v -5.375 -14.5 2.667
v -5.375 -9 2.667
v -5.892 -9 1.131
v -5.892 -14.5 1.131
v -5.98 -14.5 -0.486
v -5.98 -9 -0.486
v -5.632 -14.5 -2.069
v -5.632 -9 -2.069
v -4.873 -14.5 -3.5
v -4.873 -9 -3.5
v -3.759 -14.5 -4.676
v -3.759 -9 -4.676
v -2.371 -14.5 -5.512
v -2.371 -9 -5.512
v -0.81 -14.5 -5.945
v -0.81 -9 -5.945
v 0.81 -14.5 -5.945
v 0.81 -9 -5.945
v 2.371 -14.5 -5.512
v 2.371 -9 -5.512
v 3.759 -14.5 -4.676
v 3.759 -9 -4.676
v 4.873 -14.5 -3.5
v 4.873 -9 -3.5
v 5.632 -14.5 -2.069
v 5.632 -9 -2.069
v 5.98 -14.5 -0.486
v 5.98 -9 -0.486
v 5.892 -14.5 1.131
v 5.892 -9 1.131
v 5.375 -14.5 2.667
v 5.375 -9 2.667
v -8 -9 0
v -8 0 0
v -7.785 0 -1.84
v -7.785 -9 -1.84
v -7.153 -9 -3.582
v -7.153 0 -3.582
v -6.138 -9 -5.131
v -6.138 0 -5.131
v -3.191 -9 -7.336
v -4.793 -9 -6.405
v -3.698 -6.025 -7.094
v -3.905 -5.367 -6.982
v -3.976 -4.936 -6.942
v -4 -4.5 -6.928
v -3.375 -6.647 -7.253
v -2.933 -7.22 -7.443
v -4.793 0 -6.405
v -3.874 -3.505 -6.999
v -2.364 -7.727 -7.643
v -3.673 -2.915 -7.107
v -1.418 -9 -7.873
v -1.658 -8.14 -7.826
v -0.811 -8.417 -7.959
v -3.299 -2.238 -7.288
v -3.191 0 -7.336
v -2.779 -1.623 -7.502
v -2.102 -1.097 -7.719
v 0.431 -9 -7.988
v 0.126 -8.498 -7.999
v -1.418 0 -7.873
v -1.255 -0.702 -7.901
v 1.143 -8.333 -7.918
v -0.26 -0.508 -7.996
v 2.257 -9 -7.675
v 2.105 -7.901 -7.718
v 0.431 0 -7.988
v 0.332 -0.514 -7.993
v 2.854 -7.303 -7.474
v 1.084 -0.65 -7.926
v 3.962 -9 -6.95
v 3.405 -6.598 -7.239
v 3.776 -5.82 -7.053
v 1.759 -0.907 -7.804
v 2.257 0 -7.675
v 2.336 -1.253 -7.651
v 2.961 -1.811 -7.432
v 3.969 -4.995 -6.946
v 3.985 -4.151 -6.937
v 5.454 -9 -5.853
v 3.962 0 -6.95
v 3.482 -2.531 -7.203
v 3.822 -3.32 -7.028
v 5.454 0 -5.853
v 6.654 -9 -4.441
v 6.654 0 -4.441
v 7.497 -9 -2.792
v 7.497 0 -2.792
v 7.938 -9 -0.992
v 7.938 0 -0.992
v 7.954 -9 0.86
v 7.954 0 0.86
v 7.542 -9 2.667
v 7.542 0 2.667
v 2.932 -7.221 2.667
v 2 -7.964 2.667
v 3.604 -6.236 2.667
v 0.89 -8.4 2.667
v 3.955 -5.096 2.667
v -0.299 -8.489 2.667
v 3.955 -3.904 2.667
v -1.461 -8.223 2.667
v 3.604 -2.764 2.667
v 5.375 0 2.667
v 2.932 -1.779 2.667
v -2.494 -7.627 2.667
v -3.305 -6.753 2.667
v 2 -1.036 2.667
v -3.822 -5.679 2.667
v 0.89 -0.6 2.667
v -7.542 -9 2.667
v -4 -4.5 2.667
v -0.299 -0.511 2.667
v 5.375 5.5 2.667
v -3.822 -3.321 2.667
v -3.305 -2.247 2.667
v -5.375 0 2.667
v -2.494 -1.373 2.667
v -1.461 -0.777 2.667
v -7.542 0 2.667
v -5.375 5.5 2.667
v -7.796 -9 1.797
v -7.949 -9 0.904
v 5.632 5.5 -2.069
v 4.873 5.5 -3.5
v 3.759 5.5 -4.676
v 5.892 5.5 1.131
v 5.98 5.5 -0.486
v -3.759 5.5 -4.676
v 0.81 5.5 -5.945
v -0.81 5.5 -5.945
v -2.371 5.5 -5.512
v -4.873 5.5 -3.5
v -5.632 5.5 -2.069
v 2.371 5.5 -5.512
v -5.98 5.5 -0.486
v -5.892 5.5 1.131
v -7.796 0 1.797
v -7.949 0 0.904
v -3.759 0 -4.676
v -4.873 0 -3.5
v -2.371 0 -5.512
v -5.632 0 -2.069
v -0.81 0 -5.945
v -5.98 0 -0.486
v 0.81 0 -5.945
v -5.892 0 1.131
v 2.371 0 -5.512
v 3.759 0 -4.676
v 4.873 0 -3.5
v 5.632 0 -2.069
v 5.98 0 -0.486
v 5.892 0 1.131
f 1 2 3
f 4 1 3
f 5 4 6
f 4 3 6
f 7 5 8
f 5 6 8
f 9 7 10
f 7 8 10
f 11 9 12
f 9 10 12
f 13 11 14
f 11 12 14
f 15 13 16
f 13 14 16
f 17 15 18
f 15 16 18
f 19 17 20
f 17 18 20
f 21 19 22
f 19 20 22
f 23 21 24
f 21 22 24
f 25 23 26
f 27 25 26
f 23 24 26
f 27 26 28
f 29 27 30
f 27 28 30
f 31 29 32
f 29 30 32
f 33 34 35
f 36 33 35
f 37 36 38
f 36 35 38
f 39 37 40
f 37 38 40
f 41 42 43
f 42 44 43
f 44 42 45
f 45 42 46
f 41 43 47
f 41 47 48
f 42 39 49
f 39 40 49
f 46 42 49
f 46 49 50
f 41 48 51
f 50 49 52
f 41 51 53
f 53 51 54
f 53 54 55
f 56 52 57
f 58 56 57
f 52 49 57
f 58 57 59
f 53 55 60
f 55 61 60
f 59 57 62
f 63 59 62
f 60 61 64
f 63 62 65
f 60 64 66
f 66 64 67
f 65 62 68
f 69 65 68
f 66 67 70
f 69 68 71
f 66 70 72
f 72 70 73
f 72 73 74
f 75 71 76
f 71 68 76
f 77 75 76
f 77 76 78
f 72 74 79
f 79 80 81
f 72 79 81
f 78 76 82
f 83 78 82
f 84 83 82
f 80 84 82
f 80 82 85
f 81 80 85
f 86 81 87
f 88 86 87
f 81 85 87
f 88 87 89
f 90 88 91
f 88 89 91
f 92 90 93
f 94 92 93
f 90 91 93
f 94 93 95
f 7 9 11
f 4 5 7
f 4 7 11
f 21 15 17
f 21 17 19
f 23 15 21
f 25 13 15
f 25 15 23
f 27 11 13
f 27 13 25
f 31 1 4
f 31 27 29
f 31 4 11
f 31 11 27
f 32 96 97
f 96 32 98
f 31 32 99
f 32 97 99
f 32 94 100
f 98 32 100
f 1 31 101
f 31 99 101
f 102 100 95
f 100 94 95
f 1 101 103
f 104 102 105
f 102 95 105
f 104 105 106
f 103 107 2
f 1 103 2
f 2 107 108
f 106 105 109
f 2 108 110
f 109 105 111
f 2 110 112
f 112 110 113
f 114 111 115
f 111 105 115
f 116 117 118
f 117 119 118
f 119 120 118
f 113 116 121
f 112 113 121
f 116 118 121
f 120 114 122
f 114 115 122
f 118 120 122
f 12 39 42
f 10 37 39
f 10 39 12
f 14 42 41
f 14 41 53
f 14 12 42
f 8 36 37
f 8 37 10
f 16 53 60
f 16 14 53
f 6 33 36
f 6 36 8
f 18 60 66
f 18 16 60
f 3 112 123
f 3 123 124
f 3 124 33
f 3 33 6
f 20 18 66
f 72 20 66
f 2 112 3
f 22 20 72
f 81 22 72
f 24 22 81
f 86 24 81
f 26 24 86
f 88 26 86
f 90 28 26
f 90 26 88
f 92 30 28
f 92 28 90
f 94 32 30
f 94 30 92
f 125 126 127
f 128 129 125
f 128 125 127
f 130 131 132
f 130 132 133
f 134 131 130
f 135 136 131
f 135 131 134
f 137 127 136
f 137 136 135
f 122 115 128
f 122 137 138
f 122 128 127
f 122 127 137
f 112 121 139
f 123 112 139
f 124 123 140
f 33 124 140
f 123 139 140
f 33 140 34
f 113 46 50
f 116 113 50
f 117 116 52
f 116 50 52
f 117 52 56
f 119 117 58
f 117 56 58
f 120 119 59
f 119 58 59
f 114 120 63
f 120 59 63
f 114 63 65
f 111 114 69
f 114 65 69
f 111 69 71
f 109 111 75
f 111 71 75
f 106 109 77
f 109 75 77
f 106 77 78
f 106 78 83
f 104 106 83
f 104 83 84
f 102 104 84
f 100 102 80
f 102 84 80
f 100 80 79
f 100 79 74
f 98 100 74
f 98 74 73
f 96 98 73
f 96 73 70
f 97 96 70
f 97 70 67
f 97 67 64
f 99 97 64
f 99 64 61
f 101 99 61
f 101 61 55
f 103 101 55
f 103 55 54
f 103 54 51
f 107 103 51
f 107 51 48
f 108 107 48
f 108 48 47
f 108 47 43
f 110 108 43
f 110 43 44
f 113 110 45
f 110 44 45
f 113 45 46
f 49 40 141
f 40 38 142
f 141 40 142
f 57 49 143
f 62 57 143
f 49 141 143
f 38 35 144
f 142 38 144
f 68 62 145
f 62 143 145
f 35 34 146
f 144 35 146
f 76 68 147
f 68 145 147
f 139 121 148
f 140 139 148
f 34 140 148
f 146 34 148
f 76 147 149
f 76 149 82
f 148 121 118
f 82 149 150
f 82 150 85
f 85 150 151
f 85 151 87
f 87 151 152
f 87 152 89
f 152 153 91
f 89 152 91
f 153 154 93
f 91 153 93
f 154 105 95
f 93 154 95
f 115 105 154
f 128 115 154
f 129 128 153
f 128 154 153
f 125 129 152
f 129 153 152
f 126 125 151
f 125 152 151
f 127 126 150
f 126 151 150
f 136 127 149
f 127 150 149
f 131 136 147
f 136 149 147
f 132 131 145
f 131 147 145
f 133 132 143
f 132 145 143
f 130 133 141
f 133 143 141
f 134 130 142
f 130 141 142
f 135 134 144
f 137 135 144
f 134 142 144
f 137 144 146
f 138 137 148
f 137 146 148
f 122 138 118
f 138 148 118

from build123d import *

# Parameters (mm, degrees)
F1_DEPTH = 9
F3_D     = 8
F5_DEPTH = 5.5
F7_DEPTH = 5.5


with BuildPart() as f1:
    # F0 (on Front) → F1 (new body)
    with BuildSketch(Plane.XZ):
        with BuildLine():
            ThreePointArc((-7.542472, 2.666667), (-7.884788, 1.352816), (-8, 0))
            ThreePointArc((-8, 0), (1.352816, -7.884788), (7.542472, 2.666667))
            Line((7.542472, 2.666667), (-7.542472, 2.666667))
        make_face()
    extrude(amount=F1_DEPTH)

    # F3 (through all)
    with Locations(Plane.XY.offset(2.666667)):
        with Locations((0, -4.5)):
            Hole(F3_D / 2)

    # F4 (on face) → F5 (join)
    with BuildSketch(Plane.XZ.offset(9)):
        with BuildLine():
            Line((5.374838, 2.666667), (-5.374838, 2.666667))
            ThreePointArc((-5.374838, 2.666667), (0, -6), (5.374838, 2.666667))
        make_face()
    extrude(amount=F5_DEPTH)

    # F6 (on face) → F7 (join)
    with BuildSketch(Plane(origin=(0, 0, 0), x_dir=(-1, 0, 0), z_dir=(0, 1, 0))):
        with BuildLine():
            Line((5.374838, 2.666667), (-5.374838, 2.666667))
            ThreePointArc((-5.374838, 2.666667), (0, -6), (5.374838, 2.666667))
        make_face()
    extrude(amount=F7_DEPTH)


solid = f1.part
